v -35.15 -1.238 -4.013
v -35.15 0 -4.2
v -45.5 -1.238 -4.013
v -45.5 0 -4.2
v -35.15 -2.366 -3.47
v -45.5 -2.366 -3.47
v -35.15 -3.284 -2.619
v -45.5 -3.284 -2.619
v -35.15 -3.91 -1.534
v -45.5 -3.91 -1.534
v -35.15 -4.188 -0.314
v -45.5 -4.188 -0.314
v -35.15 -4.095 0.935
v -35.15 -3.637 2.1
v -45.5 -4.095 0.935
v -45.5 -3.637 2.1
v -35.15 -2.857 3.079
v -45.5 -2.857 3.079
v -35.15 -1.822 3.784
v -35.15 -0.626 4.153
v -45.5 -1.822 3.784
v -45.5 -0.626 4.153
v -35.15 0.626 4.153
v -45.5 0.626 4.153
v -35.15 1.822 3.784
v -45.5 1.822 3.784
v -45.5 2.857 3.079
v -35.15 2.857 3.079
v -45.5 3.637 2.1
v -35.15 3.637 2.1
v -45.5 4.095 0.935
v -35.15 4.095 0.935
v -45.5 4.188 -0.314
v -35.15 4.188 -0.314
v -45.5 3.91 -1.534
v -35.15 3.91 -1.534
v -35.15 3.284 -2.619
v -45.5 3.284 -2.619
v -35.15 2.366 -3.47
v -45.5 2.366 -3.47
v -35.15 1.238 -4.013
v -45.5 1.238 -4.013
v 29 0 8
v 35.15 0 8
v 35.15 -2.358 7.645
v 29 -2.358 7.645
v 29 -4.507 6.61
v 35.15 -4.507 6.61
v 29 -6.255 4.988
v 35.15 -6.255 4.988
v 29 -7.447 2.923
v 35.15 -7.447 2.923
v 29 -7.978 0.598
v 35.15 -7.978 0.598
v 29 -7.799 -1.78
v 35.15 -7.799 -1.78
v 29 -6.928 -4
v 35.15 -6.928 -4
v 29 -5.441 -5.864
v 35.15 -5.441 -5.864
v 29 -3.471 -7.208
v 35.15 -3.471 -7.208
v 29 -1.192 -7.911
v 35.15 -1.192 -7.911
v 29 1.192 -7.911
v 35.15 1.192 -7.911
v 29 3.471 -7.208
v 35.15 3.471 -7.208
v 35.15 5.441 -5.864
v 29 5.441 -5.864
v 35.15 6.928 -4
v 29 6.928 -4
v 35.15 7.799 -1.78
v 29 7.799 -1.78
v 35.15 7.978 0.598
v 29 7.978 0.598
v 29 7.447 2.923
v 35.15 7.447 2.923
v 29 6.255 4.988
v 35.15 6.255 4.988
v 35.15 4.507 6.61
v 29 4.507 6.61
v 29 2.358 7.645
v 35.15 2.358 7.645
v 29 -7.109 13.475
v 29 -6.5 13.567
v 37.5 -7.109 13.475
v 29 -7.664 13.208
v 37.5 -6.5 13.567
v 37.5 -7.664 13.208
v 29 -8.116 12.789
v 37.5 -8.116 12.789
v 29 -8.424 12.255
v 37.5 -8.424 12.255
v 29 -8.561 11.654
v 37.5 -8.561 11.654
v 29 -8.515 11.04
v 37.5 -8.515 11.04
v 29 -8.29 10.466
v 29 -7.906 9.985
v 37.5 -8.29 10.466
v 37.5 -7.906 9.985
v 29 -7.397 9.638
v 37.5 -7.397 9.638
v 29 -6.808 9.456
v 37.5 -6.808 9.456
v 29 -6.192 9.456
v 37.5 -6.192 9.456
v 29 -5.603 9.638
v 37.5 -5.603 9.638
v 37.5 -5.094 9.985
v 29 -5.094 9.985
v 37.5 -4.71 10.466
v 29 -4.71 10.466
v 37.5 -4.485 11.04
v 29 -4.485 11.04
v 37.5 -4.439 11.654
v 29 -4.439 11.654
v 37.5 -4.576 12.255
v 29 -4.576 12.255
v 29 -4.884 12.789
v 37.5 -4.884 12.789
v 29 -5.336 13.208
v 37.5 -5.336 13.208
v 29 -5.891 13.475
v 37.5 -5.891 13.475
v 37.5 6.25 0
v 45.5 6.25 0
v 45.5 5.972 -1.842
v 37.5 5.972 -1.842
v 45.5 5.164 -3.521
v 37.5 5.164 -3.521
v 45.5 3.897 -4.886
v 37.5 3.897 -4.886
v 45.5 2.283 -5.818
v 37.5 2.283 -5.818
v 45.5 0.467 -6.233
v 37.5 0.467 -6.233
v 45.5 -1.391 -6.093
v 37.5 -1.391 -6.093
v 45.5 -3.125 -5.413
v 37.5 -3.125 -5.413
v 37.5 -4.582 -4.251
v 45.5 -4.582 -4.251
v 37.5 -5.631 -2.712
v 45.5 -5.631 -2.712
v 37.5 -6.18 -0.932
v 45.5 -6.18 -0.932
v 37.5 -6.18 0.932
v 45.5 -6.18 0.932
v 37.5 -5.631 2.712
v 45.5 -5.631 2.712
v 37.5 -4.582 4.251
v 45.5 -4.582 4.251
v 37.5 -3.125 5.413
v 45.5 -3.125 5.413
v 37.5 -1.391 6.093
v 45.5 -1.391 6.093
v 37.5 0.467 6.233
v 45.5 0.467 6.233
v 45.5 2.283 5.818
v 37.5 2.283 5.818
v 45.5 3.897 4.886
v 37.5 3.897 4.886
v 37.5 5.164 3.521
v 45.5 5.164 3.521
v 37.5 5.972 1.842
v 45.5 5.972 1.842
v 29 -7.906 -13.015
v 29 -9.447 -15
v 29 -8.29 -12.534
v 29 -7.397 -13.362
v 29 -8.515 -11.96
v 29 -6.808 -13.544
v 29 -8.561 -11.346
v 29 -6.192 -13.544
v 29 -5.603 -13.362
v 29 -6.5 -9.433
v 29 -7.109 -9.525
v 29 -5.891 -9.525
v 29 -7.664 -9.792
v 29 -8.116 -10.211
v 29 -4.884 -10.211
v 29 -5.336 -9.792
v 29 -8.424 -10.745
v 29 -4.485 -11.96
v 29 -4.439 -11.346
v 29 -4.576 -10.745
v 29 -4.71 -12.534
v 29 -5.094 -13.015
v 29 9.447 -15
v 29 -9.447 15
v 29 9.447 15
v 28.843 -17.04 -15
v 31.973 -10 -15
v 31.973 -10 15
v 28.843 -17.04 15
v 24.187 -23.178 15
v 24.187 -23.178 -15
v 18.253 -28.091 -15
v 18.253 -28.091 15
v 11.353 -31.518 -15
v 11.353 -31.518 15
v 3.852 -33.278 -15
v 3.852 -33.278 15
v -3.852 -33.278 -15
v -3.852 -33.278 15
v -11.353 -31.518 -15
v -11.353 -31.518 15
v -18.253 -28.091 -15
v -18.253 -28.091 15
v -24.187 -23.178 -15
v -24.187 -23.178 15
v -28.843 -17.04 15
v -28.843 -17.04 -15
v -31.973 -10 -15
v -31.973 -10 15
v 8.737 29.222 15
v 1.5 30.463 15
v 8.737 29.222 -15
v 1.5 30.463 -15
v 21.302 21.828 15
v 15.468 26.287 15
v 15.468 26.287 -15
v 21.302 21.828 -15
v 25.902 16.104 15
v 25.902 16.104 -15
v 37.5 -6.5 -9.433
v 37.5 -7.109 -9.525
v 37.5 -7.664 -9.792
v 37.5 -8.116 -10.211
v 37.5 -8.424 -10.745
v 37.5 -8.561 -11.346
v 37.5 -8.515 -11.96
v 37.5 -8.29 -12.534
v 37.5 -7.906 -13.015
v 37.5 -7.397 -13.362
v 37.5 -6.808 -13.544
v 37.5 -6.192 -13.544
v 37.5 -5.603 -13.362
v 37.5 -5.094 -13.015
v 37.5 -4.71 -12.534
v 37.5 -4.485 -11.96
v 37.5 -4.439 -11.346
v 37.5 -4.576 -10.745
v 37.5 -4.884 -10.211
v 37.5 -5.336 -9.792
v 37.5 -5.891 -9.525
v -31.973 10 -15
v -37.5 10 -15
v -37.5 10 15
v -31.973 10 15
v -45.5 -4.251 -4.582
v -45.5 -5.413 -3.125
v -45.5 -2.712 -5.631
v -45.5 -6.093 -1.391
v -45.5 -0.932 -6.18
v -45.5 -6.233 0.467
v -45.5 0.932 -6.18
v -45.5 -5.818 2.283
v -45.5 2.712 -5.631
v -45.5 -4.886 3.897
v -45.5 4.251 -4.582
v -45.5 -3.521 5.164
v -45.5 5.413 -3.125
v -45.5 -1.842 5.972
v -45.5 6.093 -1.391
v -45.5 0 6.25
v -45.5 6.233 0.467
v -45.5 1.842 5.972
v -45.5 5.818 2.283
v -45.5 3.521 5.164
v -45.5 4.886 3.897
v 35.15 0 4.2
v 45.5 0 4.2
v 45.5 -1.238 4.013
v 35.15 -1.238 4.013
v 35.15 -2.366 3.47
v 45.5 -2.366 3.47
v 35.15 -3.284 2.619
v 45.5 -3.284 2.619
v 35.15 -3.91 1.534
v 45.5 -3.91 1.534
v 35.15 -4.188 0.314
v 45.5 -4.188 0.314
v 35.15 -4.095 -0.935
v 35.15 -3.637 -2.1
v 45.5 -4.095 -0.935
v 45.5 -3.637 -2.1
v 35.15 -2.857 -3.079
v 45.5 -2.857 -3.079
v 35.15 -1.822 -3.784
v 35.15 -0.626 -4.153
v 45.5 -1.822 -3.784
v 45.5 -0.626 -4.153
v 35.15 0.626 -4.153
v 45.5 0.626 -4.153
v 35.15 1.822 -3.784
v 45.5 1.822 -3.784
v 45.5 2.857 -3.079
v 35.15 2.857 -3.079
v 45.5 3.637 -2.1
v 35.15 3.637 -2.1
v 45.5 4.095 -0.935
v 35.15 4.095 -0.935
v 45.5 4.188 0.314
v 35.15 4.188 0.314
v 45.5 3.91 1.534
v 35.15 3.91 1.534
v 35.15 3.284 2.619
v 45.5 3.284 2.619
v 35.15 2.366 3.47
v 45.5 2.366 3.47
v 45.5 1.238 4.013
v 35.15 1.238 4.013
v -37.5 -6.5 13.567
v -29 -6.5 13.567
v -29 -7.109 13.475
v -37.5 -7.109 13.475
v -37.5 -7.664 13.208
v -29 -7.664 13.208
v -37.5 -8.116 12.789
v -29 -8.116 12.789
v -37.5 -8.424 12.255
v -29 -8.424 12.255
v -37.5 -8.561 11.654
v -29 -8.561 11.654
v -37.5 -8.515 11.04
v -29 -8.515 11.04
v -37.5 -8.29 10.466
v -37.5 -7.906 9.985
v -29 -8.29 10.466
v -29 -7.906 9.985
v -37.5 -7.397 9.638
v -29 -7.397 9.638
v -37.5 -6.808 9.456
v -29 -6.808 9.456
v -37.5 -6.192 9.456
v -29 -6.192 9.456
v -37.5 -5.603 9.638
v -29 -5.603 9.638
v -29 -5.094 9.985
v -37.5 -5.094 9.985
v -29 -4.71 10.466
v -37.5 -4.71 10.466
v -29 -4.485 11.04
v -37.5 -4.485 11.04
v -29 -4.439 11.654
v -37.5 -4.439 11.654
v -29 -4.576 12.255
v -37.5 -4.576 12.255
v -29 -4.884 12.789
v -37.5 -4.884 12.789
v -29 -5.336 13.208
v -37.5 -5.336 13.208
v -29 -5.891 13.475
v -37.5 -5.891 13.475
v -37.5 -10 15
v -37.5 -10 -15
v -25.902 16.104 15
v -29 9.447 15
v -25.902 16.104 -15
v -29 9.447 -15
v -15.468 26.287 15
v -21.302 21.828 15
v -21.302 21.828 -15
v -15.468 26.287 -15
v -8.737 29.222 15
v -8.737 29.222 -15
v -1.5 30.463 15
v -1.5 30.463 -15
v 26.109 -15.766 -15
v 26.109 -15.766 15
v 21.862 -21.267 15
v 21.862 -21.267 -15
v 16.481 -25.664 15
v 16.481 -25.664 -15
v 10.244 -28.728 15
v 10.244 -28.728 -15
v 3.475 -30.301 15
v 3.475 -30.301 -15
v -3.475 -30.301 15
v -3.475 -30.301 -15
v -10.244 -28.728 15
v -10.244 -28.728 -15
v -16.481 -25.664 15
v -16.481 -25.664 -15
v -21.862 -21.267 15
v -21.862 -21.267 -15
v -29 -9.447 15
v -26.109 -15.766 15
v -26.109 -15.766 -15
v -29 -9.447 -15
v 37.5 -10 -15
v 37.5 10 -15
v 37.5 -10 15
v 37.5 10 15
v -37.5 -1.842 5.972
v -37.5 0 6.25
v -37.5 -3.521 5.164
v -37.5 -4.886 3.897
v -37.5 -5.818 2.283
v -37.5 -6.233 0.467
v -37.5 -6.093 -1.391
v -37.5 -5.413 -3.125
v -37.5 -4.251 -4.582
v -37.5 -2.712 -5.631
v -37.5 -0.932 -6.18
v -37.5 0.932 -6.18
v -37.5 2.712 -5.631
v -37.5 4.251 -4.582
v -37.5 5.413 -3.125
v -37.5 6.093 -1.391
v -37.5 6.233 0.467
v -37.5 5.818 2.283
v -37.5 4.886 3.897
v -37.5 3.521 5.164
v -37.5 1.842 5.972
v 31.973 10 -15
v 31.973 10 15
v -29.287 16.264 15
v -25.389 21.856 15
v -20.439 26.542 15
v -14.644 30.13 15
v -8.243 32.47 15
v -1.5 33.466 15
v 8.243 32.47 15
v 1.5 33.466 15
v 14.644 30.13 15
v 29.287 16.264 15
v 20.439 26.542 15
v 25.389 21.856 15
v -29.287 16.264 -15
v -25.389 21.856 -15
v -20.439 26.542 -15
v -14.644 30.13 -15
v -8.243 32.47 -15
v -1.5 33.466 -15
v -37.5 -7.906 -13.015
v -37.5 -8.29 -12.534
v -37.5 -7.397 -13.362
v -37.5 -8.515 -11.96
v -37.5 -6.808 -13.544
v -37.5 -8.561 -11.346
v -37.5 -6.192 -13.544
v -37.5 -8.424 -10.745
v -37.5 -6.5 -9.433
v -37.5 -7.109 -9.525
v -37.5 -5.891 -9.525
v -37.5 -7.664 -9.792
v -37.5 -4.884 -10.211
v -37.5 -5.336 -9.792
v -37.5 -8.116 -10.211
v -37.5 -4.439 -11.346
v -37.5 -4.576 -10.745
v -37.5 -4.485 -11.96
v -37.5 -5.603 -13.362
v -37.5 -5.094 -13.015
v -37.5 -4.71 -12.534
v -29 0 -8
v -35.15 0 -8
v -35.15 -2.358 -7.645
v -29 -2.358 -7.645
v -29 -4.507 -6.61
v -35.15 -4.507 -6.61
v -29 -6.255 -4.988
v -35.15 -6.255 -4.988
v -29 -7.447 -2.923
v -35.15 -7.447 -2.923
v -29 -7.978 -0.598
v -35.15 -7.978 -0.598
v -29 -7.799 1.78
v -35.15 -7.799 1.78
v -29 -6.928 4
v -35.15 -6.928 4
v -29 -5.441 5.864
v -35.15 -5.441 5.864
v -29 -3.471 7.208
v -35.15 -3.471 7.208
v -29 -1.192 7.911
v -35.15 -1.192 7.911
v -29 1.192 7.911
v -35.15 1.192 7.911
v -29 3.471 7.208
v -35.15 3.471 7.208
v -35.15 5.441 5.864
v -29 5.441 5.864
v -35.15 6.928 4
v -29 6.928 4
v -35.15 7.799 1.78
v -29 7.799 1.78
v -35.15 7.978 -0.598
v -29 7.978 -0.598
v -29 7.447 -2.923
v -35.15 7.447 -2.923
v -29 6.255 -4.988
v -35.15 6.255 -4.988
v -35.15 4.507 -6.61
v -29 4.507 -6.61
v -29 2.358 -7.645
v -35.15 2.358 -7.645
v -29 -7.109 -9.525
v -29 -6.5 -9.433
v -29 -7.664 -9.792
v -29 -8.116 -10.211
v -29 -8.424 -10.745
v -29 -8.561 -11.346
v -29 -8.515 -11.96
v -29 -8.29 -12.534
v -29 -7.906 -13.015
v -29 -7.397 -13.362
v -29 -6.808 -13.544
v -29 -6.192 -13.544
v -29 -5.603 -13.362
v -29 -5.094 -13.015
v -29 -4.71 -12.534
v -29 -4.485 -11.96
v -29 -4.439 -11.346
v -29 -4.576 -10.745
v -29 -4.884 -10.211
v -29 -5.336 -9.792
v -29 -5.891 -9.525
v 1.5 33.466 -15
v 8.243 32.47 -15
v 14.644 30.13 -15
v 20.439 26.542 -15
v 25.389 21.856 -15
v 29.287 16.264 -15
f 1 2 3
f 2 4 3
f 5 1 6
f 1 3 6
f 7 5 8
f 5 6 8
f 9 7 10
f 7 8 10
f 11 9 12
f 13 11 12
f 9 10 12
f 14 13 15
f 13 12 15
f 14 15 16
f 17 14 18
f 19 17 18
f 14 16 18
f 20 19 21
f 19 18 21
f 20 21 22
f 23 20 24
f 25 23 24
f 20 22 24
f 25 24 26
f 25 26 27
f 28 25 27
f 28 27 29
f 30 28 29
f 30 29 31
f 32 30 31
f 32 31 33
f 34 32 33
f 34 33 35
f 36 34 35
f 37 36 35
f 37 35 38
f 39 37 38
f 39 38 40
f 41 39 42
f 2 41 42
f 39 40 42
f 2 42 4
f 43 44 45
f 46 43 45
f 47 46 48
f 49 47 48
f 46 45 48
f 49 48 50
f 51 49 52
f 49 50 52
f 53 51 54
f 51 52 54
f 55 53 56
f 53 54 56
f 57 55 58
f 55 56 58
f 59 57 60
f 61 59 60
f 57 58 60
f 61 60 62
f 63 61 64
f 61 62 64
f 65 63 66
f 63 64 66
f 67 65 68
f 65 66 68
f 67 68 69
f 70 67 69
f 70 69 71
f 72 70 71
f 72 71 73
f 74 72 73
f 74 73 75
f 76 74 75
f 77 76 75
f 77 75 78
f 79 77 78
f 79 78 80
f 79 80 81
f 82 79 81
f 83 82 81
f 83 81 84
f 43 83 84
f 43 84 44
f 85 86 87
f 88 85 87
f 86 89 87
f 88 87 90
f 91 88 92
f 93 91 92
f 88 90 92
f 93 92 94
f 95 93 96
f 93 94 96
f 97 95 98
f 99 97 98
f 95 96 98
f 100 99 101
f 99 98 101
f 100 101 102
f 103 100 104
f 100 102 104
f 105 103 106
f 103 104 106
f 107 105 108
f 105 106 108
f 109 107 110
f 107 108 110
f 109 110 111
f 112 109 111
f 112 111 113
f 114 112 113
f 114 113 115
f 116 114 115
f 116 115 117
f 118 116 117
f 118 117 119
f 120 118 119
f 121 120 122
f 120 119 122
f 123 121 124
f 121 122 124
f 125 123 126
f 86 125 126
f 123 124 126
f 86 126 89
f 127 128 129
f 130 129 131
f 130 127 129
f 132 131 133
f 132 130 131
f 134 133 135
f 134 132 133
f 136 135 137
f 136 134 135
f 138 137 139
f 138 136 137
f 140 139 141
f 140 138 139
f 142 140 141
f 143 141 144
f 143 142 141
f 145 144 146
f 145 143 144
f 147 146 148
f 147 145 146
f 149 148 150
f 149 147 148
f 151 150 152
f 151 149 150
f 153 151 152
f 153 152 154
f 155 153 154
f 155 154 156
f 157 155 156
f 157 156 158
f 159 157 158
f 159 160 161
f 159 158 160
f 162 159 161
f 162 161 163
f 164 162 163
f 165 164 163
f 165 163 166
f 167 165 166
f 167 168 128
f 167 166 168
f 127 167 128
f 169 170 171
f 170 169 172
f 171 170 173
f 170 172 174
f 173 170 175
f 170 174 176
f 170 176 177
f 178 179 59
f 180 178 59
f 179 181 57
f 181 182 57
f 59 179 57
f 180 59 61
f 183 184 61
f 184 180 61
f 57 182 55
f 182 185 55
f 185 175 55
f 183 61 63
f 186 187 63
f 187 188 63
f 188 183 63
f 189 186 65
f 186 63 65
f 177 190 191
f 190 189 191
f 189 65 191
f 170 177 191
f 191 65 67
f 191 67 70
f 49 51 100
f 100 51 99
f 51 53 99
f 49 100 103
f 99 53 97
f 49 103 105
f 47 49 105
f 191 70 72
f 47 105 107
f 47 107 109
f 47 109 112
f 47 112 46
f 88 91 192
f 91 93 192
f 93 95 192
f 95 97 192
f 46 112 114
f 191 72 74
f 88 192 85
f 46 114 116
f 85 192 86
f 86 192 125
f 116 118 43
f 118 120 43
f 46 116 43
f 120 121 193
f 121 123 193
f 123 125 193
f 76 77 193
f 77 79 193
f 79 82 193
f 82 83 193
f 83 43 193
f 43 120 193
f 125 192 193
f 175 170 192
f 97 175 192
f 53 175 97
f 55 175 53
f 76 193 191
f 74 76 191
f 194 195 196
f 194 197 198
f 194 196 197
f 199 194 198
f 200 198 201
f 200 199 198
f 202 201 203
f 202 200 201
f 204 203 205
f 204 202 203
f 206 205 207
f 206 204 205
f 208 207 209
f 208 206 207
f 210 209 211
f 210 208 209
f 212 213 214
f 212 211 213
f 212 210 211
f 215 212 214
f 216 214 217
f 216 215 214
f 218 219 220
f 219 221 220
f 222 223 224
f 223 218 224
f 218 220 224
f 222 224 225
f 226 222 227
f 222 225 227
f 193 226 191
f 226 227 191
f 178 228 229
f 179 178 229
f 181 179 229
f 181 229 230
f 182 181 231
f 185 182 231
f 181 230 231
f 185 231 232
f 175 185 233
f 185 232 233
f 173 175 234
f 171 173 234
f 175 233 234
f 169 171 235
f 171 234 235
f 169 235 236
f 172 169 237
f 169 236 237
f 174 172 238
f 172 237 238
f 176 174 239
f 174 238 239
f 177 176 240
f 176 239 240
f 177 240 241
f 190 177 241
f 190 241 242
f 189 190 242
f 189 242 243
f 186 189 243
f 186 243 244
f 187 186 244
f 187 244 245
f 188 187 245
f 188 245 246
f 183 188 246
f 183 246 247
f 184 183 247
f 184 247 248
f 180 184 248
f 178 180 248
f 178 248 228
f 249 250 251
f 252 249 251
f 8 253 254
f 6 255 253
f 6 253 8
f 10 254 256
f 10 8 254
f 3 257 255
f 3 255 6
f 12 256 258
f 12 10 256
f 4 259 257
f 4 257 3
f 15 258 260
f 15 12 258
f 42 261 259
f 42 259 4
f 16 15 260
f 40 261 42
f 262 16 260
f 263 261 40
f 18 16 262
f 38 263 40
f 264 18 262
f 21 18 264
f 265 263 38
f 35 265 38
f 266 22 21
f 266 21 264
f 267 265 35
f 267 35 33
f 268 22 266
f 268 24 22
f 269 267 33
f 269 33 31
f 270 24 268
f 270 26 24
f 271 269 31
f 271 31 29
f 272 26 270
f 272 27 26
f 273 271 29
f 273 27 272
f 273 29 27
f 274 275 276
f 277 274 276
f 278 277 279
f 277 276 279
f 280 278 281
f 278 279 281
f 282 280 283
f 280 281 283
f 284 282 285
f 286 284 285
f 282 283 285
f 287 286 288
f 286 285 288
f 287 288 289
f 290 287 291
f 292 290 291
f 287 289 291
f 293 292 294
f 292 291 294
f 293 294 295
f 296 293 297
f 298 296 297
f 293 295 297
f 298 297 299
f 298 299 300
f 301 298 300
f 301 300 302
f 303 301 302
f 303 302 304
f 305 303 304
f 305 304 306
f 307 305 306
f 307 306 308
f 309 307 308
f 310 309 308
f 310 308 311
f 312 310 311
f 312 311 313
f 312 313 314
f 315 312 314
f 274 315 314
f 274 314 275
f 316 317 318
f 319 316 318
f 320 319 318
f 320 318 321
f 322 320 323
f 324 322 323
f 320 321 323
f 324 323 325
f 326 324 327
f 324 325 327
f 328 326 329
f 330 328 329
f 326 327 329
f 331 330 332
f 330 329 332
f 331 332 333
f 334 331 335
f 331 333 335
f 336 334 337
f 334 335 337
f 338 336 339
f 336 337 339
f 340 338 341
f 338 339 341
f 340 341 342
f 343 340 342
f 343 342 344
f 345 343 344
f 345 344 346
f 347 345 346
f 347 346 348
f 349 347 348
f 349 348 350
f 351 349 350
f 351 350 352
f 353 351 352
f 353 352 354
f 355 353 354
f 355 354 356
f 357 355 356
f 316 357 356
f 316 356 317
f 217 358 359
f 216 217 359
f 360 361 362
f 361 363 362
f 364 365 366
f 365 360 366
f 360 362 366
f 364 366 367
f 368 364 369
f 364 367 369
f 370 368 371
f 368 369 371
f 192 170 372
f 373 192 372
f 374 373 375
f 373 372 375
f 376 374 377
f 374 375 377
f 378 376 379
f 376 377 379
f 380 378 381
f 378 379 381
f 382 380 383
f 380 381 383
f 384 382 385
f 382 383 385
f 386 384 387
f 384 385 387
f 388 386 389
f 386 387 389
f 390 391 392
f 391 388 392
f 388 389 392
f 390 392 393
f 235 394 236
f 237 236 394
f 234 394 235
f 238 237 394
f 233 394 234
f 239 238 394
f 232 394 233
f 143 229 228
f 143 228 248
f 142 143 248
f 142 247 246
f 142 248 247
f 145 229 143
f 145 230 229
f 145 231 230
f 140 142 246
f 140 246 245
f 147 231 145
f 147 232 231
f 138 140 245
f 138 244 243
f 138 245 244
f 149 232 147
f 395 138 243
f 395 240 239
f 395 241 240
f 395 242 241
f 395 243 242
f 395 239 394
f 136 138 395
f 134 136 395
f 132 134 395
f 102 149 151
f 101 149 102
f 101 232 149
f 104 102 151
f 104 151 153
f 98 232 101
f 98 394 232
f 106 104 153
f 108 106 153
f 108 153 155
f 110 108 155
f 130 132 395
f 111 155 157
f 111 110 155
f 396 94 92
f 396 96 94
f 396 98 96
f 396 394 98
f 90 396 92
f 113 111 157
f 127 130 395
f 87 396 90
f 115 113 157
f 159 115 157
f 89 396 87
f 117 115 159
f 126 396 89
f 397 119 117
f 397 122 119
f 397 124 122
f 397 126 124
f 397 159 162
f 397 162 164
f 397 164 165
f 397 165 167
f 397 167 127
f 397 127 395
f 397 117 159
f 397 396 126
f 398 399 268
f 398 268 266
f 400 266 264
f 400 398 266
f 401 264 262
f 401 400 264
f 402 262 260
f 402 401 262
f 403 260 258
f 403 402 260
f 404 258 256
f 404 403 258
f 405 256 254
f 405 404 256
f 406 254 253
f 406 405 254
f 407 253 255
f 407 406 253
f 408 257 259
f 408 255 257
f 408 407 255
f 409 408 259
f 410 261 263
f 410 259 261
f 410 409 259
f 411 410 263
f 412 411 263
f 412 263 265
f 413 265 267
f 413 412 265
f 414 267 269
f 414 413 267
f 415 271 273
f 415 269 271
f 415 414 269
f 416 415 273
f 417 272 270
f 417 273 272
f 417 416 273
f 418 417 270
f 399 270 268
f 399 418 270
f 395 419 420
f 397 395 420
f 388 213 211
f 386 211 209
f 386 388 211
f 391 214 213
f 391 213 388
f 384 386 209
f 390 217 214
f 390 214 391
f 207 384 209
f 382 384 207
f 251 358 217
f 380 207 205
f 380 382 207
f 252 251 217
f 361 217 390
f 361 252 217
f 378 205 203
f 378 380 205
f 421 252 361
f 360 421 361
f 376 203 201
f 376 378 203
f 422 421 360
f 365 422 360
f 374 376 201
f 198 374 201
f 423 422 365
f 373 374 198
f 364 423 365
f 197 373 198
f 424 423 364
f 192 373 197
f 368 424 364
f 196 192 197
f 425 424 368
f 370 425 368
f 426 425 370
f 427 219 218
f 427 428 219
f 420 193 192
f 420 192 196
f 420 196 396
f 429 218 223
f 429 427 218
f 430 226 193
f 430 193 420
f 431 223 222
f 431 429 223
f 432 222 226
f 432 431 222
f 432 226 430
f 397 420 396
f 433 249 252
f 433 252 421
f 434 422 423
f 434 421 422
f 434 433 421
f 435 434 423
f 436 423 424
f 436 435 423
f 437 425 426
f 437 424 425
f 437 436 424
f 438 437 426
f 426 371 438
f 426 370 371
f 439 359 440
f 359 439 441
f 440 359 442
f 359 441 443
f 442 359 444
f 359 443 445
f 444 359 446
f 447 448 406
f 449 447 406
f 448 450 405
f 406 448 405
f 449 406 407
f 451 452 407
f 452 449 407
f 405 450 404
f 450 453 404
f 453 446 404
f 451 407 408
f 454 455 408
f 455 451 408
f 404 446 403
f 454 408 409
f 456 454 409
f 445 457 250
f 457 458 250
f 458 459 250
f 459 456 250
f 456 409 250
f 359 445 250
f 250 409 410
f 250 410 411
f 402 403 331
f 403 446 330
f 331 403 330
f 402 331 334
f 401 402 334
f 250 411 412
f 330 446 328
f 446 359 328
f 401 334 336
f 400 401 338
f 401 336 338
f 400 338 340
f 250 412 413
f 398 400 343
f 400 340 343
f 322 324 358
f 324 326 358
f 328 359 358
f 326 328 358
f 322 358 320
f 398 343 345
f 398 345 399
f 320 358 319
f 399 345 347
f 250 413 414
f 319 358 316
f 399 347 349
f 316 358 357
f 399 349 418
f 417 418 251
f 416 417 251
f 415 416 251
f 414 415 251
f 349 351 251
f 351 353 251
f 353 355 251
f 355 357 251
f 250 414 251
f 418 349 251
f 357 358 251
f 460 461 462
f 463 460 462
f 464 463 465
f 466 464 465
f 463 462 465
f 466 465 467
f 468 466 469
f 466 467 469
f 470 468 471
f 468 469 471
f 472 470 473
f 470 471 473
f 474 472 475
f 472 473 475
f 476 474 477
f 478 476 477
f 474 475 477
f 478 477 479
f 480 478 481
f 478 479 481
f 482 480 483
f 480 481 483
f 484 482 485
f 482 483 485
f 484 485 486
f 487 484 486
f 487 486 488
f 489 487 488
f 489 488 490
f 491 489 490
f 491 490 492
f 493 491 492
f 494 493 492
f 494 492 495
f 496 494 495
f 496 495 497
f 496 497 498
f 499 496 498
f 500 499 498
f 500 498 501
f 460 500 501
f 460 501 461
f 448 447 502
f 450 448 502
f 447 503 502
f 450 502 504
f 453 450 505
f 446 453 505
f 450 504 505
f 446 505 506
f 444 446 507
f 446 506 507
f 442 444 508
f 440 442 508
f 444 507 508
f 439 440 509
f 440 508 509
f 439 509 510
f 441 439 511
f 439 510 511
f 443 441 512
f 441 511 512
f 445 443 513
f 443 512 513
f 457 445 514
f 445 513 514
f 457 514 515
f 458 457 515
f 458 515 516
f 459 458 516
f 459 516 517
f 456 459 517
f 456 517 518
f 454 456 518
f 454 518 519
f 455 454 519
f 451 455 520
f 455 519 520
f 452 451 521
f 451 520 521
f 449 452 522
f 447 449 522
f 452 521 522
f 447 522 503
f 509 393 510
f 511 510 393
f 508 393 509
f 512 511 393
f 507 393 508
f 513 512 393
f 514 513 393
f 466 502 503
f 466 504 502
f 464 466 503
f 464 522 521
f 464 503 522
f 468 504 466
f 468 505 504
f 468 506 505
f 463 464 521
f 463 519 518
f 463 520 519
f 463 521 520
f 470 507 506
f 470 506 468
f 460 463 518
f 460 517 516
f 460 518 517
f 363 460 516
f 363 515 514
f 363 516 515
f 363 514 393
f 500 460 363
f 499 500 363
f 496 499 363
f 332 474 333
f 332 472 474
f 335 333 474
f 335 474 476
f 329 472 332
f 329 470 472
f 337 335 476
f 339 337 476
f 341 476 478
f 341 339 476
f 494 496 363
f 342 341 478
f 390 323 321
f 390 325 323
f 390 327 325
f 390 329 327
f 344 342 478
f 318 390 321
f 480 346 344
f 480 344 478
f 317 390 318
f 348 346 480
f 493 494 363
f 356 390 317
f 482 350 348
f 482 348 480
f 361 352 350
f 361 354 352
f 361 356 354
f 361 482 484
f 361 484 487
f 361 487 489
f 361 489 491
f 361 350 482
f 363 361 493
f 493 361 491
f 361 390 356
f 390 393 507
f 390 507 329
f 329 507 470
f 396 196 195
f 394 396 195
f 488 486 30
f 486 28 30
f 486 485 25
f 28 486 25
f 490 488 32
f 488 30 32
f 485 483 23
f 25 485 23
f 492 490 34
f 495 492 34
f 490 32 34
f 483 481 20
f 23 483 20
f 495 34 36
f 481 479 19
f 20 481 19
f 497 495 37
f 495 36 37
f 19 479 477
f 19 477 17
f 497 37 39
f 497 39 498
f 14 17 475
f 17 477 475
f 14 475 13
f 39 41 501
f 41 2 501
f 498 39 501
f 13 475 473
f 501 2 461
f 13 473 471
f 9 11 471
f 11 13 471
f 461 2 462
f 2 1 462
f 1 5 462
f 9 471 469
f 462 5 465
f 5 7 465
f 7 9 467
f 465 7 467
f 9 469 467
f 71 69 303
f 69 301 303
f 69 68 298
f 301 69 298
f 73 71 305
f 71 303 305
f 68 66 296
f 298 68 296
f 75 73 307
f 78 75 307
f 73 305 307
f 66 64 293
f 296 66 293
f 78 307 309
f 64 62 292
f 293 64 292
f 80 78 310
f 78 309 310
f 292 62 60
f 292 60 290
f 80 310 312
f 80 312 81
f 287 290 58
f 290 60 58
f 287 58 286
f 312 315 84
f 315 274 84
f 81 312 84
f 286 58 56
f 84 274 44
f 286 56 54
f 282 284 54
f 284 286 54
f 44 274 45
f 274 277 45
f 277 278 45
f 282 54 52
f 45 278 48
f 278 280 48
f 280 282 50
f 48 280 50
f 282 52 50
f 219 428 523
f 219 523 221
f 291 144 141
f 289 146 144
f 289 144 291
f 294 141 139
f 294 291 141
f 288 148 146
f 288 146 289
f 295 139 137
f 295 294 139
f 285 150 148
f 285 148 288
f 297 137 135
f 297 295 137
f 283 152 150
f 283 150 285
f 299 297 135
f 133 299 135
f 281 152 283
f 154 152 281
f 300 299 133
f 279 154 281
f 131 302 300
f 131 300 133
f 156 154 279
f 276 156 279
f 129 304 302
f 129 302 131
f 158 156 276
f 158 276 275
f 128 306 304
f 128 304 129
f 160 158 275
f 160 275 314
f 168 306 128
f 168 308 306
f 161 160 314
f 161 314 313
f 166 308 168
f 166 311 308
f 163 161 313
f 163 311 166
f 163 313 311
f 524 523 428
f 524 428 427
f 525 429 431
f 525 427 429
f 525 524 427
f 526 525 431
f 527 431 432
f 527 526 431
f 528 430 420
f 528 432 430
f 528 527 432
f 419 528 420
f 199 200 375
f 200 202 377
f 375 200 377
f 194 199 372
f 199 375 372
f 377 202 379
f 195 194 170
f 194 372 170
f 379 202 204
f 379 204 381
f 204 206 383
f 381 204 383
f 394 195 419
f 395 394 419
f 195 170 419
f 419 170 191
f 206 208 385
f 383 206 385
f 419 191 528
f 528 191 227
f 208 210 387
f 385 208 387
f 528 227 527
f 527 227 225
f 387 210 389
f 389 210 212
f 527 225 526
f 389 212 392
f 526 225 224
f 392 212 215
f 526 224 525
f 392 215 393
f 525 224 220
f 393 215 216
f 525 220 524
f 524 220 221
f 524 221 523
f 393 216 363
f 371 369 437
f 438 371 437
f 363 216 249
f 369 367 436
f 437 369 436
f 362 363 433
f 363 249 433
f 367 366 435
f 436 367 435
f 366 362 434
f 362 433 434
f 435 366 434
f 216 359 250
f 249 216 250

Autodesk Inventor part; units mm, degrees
ref_plane "XZ Plane" through (0, 0, 0) normal (0, 1, 0) x (-1, 0, 0)
ref_plane "XY Plane" through (0, 0, 0) normal (0, 0, 1) x (1, 0, 0)
sketch "Sketch1" plane through (0, 0, 0) normal (0, 0, 1) x (1, 0, 0)
  circle A0 centre (0, 0) radius 30.5
  circle A1 centre (0, 0) radius 33.5
  dimension "d0" = 61
  dimension "d1" = 67
extrude "Extrusion1" add sketch "Sketch1" along normal mid plane 30
ref_plane "Work Plane2" through (-33.5, 0, 0) normal (1, 0, 0) x (0, 1, 0)
ref_plane "Work Plane1" through (33.5, 0, 0) normal (1, 0, 0) x (0, 1, 0)
sketch "Sketch3" plane through (33.5, 0, 0) normal (1, 0, 0) x (0, 1, 0)
  line L0 (-30.5, 15) -> (30.5, 15) projected
  line L1 (-10, -15) -> (10, -15)
  line L2 (10, -15) -> (10, 15)
  line L3 (10, 15) -> (-10, 15)
  line L4 (-10, 15) -> (-10, -15)
  line L5 (-10, -15) -> (10, 15) construction
  line L6 (10, -15) -> (-10, 15) construction
  point P0 (0, 0)
  dimension "d20" = 20
extrude "Extrusion2" add sketch "Sketch3" along normal blind 4 and the other way blind 4.5
sketch "Sketch4" plane through (-33.5, 0, 0) normal (1, 0, 0) x (0, 1, 0)
  line L0 (30.5, -15) -> (-30.5, -15) projected
  line L1 (10, 15) -> (-10, 15)
  line L2 (-10, 15) -> (-10, -15)
  line L3 (-10, -15) -> (10, -15)
  line L4 (10, -15) -> (10, 15)
  line L5 (10, 15) -> (-10, -15) construction
  line L6 (-10, 15) -> (10, -15) construction
  point P0 (0, 0)
  dimension "d25" = 20
extrude "Extrusion3" add sketch "Sketch4" along normal blind 4.5 and the other way blind 4
sketch "Sketch5" plane through (33.5, 0, 0) normal (1, 0, 0) x (0, 1, 0)
  circle A0 centre (0, 0) radius 3.5
  circle A1 centre (0, 0) radius 6.25
  dimension "d30" = 7
  dimension "d31" = 12.5
extrude "Extrusion4" add sketch "Sketch5" along normal blind 12
sketch "Sketch6" plane through (-37.5, 0, 0) normal (-1, 0, 0) x (0, 0, 1)
  circle A0 centre (0, 0) radius 3.5
  circle A1 centre (0, 0) radius 6.25
  dimension "d35" = 7
  dimension "d36" = 12.5
extrude "Extrusion5" add sketch "Sketch6" along normal blind 8
sketch "Sketch8" plane through (-29, 0, 0) normal (1, 0, 0) x (0, 0, -1)
  point P0 (0, 0)
  point P1 (0, 0)
hole "Hole3" at (-29, 0, 0) direction (-1, 0, 0) diameter 8.4 depth 16.5 counterbore diameter 16 counterbore depth 6.15
sketch "Sketch9" plane through (29, 0, 0) normal (-1, 0, 0) x (0, 0, 1)
  point P0 (0, 0)
  point P1 (0, 0)
hole "Hole4" at (29, 0, 0) direction (1, 0, 0) diameter 8.4 depth 16.5 counterbore diameter 16 counterbore depth 6.15
sketch "Sketch10" plane through (-37.5, 0, 0) normal (-1, 0, 0) x (0, 0, 1)
  line L0 (-15, 10) -> (-15, -10) projected
  line L1 (15, -10) -> (15, 10) projected
  line L2 (-15, -10) -> (15, -10) projected
  point P0 (0, 0)
  point P1 (11.5, -6.5)
  point P2 (-11.5, -6.5)
  dimension "d58" = 3.5
  dimension "d59" = 3.5
  dimension "d60" = 3.5
hole "Hole5" at (-37.5, -6.5, 11.5) at (-37.5, -6.5, -11.5) direction (1, 0, 0) diameter 4.134 depth 75 thread size "M5x0.8" class "6H" standard "ANSI Metric M Profile"
sketch "Sketch11" plane through (0, 0, 15) normal (0, 0, 1) x (1, 0, 0)
  line L0 (-1.5, 37.1959) -> (1.5, 37.1959)
  line L1 (1.5, 37.1959) -> (1.5, 23.2844)
  line L2 (1.5, 23.2844) -> (-1.5, 23.2844)
  line L3 (-1.5, 23.2844) -> (-1.5, 37.1959)
  point P0 (0, 0)
  dimension "d68" = 1.5
  dimension "d69" = 1.5
extrude "Extrusion7" cut sketch "Sketch11" against normal through all
equation "\"d25\" = d20"
equation "\"d59\" = d58"
properties part number "Soporte_PVC_Balancin"
